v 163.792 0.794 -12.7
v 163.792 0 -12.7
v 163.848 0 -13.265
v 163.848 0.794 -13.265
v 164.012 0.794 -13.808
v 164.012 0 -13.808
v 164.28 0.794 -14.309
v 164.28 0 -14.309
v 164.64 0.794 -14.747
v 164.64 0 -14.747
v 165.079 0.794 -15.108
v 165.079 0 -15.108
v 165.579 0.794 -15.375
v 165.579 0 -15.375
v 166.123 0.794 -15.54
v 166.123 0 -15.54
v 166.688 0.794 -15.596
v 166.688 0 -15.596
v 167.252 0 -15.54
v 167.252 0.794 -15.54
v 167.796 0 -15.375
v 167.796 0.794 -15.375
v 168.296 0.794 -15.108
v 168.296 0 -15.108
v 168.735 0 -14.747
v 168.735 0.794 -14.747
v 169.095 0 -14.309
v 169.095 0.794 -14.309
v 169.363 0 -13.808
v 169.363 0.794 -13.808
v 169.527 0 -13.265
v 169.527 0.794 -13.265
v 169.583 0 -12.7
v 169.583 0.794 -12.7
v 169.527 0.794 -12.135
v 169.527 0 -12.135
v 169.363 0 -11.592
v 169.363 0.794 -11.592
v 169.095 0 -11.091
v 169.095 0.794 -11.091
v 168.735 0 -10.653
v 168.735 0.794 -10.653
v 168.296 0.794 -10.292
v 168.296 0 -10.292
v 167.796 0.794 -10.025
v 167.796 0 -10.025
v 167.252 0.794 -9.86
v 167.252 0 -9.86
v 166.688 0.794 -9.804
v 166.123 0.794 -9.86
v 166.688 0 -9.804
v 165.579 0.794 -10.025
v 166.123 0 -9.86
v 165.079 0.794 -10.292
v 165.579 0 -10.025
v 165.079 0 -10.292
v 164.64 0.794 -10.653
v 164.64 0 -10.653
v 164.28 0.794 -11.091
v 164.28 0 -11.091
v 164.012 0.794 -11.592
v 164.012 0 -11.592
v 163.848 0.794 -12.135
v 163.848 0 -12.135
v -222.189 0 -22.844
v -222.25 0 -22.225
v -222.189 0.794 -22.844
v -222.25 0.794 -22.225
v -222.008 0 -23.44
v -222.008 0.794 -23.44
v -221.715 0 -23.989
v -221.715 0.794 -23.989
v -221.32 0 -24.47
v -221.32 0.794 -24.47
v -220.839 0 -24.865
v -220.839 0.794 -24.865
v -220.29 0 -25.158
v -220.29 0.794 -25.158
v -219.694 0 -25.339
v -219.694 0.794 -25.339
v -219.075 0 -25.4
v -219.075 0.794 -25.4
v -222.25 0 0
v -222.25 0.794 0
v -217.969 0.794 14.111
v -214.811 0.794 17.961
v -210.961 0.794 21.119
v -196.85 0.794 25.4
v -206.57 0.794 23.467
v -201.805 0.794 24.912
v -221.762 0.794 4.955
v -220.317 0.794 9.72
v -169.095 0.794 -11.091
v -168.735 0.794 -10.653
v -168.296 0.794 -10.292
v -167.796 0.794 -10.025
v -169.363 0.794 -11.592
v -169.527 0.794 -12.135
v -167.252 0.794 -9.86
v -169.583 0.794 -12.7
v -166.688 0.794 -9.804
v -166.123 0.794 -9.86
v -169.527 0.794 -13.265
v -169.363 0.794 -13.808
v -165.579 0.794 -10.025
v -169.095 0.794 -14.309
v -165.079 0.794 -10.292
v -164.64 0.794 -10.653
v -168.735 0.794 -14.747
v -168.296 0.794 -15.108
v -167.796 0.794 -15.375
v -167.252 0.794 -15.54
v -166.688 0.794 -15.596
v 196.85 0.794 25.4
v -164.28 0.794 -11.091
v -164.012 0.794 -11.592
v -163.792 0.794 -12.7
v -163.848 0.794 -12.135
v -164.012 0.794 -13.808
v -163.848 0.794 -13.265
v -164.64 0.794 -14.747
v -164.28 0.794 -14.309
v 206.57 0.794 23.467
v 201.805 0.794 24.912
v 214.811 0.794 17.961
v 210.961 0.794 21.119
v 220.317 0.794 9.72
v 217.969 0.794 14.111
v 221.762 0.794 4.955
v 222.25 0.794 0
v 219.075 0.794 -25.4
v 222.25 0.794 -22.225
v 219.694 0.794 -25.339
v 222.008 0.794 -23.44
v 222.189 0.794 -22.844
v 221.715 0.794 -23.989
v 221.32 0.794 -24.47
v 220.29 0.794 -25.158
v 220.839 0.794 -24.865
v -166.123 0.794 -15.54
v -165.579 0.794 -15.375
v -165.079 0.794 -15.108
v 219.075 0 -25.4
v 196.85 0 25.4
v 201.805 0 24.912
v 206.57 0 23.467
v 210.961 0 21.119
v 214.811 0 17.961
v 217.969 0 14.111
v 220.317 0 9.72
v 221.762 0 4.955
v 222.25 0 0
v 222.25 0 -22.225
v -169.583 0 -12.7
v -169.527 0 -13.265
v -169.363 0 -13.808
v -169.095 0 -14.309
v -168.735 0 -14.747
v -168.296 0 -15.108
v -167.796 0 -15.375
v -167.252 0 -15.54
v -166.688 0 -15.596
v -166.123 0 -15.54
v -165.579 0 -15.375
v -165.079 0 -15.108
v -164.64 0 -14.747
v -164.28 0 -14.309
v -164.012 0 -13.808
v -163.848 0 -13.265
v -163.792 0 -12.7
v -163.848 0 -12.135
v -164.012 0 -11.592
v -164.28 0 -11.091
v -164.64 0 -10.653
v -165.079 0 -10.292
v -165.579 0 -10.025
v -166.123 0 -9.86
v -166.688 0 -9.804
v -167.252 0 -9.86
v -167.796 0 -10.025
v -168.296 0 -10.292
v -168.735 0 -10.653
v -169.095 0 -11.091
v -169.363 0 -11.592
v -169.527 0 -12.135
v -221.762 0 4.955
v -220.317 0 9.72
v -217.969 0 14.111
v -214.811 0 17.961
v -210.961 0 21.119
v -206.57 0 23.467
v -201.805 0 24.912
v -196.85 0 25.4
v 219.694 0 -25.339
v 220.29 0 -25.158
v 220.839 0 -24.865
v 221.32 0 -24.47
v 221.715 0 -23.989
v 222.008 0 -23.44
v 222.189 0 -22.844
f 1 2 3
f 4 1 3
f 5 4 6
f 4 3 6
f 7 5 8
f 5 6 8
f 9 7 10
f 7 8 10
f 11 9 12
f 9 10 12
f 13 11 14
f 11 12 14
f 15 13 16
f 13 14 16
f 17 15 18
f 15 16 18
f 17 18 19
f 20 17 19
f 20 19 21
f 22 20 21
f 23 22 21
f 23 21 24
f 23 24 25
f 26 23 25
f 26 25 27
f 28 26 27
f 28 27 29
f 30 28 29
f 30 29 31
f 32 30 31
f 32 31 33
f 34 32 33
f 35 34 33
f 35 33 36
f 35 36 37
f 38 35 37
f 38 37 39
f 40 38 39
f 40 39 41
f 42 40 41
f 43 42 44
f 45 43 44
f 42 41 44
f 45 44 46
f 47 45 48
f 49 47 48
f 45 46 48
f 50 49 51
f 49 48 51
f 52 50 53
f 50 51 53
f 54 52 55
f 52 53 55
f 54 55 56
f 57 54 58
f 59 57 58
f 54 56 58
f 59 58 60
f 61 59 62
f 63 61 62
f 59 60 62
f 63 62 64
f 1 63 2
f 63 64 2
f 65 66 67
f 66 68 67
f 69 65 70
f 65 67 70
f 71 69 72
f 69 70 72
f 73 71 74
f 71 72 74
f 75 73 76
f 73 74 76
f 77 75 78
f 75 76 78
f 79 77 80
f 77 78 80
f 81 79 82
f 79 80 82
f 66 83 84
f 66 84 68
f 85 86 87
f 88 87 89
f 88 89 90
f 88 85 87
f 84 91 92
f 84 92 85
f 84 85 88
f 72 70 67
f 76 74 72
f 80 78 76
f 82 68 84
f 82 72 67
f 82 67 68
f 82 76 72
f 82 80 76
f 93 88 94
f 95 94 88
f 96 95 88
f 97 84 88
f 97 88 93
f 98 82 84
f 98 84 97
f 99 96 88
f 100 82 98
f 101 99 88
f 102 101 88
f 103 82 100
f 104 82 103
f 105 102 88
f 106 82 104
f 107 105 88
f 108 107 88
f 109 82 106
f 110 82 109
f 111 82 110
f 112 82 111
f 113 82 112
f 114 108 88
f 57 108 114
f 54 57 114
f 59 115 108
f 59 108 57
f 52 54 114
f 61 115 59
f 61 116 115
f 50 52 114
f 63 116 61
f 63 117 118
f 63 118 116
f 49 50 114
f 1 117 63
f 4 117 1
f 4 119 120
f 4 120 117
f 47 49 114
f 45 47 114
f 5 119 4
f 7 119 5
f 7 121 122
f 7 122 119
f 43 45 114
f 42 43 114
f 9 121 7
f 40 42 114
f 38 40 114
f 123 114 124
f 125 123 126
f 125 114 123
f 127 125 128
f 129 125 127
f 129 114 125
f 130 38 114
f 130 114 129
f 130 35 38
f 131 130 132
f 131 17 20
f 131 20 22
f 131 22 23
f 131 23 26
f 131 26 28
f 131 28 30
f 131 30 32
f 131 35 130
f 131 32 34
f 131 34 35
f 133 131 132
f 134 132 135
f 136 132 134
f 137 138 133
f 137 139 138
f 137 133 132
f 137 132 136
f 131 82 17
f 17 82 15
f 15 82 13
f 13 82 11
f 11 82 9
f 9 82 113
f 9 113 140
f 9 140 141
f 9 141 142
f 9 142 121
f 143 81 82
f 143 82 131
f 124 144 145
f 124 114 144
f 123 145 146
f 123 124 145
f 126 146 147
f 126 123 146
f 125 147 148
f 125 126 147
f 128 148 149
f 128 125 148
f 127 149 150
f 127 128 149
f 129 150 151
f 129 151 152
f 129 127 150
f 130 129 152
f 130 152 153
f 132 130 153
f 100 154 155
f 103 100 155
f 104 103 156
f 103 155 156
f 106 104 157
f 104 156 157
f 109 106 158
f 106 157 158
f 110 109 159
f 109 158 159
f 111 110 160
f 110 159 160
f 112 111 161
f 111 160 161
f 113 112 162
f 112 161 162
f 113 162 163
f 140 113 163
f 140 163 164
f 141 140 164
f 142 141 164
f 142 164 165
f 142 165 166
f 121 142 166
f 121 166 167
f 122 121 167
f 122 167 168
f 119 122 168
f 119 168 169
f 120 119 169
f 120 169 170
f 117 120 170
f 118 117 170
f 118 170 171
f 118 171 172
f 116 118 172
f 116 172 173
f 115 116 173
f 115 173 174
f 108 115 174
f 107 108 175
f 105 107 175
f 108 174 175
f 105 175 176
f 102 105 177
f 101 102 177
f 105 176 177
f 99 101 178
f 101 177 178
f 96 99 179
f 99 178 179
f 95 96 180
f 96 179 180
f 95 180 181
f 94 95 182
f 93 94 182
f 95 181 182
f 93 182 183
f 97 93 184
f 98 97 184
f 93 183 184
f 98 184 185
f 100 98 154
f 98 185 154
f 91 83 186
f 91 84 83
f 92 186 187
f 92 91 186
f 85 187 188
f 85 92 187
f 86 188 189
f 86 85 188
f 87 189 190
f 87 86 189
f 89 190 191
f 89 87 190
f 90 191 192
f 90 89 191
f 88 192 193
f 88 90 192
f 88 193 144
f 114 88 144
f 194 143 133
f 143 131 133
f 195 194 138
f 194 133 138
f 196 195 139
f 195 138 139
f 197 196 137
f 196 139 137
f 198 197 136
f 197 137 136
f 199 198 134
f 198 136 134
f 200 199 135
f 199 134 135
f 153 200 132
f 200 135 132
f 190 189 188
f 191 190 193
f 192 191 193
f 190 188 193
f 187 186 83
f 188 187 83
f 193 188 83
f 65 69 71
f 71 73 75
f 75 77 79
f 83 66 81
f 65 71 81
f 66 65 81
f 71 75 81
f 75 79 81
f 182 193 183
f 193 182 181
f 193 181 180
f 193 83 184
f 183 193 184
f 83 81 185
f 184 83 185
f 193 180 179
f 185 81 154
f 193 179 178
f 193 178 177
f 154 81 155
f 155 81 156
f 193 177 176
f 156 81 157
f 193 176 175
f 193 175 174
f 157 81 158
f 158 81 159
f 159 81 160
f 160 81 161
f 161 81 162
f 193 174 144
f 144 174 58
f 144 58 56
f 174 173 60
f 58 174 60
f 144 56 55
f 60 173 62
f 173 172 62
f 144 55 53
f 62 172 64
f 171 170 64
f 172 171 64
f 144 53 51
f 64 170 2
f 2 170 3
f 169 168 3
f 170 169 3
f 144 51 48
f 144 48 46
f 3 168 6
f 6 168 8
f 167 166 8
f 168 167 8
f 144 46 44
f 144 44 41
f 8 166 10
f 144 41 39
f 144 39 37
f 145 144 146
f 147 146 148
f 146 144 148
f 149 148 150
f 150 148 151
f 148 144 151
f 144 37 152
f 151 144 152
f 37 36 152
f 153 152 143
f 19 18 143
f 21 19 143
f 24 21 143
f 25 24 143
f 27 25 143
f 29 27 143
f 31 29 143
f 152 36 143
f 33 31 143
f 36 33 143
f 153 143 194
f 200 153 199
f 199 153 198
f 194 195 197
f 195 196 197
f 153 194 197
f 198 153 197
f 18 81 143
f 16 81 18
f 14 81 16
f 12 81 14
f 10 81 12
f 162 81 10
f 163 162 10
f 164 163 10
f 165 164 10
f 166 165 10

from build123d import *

# Parameters (mm, degrees)
SKETCH1_W                  = 444.5
SKETCH1_H                  = 50.8
BOSS_EXTRUDE1_DEPTH        = 0.79375
FILLET1_R                  = 25.4
FILLET2_R                  = 3.175
F_1_0_228_DIAMETER_HOLE1_D = 5.7912


with BuildPart() as part:
    # Sketch1 → Boss-Extrude1 (new body)
    with BuildSketch(Plane(origin=(0, 0, 0), x_dir=(1, 0, 0), z_dir=(0, 1, 0))):
        Rectangle(SKETCH1_W, SKETCH1_H)
    extrude(amount=BOSS_EXTRUDE1_DEPTH)

    # Fillet1
    fillet1_edges = [part.edges().sort_by_distance(p)[0] for p in [
        (222.25, 0.396875, 25.4),
        (-222.25, 0.396875, 25.4),
    ]]
    fillet(fillet1_edges, radius=FILLET1_R)

    # Fillet2
    fillet2_edges = [part.edges().sort_by_distance(p)[0] for p in [
        (-222.25, 0.396875, -25.4),
        (222.25, 0.396875, -25.4),
    ]]
    fillet(fillet2_edges, radius=FILLET2_R)

    # #1 (0.228) Diameter Hole1 (through all)
    with Locations(Plane(origin=(0, 0.79375, 0), x_dir=(1, 0, 0), z_dir=(0, 1, 0))):
        with Locations((166.6875, 12.7), (-166.6875, 12.7)):
            Hole(F_1_0_228_DIAMETER_HOLE1_D / 2)


solid = part.part
